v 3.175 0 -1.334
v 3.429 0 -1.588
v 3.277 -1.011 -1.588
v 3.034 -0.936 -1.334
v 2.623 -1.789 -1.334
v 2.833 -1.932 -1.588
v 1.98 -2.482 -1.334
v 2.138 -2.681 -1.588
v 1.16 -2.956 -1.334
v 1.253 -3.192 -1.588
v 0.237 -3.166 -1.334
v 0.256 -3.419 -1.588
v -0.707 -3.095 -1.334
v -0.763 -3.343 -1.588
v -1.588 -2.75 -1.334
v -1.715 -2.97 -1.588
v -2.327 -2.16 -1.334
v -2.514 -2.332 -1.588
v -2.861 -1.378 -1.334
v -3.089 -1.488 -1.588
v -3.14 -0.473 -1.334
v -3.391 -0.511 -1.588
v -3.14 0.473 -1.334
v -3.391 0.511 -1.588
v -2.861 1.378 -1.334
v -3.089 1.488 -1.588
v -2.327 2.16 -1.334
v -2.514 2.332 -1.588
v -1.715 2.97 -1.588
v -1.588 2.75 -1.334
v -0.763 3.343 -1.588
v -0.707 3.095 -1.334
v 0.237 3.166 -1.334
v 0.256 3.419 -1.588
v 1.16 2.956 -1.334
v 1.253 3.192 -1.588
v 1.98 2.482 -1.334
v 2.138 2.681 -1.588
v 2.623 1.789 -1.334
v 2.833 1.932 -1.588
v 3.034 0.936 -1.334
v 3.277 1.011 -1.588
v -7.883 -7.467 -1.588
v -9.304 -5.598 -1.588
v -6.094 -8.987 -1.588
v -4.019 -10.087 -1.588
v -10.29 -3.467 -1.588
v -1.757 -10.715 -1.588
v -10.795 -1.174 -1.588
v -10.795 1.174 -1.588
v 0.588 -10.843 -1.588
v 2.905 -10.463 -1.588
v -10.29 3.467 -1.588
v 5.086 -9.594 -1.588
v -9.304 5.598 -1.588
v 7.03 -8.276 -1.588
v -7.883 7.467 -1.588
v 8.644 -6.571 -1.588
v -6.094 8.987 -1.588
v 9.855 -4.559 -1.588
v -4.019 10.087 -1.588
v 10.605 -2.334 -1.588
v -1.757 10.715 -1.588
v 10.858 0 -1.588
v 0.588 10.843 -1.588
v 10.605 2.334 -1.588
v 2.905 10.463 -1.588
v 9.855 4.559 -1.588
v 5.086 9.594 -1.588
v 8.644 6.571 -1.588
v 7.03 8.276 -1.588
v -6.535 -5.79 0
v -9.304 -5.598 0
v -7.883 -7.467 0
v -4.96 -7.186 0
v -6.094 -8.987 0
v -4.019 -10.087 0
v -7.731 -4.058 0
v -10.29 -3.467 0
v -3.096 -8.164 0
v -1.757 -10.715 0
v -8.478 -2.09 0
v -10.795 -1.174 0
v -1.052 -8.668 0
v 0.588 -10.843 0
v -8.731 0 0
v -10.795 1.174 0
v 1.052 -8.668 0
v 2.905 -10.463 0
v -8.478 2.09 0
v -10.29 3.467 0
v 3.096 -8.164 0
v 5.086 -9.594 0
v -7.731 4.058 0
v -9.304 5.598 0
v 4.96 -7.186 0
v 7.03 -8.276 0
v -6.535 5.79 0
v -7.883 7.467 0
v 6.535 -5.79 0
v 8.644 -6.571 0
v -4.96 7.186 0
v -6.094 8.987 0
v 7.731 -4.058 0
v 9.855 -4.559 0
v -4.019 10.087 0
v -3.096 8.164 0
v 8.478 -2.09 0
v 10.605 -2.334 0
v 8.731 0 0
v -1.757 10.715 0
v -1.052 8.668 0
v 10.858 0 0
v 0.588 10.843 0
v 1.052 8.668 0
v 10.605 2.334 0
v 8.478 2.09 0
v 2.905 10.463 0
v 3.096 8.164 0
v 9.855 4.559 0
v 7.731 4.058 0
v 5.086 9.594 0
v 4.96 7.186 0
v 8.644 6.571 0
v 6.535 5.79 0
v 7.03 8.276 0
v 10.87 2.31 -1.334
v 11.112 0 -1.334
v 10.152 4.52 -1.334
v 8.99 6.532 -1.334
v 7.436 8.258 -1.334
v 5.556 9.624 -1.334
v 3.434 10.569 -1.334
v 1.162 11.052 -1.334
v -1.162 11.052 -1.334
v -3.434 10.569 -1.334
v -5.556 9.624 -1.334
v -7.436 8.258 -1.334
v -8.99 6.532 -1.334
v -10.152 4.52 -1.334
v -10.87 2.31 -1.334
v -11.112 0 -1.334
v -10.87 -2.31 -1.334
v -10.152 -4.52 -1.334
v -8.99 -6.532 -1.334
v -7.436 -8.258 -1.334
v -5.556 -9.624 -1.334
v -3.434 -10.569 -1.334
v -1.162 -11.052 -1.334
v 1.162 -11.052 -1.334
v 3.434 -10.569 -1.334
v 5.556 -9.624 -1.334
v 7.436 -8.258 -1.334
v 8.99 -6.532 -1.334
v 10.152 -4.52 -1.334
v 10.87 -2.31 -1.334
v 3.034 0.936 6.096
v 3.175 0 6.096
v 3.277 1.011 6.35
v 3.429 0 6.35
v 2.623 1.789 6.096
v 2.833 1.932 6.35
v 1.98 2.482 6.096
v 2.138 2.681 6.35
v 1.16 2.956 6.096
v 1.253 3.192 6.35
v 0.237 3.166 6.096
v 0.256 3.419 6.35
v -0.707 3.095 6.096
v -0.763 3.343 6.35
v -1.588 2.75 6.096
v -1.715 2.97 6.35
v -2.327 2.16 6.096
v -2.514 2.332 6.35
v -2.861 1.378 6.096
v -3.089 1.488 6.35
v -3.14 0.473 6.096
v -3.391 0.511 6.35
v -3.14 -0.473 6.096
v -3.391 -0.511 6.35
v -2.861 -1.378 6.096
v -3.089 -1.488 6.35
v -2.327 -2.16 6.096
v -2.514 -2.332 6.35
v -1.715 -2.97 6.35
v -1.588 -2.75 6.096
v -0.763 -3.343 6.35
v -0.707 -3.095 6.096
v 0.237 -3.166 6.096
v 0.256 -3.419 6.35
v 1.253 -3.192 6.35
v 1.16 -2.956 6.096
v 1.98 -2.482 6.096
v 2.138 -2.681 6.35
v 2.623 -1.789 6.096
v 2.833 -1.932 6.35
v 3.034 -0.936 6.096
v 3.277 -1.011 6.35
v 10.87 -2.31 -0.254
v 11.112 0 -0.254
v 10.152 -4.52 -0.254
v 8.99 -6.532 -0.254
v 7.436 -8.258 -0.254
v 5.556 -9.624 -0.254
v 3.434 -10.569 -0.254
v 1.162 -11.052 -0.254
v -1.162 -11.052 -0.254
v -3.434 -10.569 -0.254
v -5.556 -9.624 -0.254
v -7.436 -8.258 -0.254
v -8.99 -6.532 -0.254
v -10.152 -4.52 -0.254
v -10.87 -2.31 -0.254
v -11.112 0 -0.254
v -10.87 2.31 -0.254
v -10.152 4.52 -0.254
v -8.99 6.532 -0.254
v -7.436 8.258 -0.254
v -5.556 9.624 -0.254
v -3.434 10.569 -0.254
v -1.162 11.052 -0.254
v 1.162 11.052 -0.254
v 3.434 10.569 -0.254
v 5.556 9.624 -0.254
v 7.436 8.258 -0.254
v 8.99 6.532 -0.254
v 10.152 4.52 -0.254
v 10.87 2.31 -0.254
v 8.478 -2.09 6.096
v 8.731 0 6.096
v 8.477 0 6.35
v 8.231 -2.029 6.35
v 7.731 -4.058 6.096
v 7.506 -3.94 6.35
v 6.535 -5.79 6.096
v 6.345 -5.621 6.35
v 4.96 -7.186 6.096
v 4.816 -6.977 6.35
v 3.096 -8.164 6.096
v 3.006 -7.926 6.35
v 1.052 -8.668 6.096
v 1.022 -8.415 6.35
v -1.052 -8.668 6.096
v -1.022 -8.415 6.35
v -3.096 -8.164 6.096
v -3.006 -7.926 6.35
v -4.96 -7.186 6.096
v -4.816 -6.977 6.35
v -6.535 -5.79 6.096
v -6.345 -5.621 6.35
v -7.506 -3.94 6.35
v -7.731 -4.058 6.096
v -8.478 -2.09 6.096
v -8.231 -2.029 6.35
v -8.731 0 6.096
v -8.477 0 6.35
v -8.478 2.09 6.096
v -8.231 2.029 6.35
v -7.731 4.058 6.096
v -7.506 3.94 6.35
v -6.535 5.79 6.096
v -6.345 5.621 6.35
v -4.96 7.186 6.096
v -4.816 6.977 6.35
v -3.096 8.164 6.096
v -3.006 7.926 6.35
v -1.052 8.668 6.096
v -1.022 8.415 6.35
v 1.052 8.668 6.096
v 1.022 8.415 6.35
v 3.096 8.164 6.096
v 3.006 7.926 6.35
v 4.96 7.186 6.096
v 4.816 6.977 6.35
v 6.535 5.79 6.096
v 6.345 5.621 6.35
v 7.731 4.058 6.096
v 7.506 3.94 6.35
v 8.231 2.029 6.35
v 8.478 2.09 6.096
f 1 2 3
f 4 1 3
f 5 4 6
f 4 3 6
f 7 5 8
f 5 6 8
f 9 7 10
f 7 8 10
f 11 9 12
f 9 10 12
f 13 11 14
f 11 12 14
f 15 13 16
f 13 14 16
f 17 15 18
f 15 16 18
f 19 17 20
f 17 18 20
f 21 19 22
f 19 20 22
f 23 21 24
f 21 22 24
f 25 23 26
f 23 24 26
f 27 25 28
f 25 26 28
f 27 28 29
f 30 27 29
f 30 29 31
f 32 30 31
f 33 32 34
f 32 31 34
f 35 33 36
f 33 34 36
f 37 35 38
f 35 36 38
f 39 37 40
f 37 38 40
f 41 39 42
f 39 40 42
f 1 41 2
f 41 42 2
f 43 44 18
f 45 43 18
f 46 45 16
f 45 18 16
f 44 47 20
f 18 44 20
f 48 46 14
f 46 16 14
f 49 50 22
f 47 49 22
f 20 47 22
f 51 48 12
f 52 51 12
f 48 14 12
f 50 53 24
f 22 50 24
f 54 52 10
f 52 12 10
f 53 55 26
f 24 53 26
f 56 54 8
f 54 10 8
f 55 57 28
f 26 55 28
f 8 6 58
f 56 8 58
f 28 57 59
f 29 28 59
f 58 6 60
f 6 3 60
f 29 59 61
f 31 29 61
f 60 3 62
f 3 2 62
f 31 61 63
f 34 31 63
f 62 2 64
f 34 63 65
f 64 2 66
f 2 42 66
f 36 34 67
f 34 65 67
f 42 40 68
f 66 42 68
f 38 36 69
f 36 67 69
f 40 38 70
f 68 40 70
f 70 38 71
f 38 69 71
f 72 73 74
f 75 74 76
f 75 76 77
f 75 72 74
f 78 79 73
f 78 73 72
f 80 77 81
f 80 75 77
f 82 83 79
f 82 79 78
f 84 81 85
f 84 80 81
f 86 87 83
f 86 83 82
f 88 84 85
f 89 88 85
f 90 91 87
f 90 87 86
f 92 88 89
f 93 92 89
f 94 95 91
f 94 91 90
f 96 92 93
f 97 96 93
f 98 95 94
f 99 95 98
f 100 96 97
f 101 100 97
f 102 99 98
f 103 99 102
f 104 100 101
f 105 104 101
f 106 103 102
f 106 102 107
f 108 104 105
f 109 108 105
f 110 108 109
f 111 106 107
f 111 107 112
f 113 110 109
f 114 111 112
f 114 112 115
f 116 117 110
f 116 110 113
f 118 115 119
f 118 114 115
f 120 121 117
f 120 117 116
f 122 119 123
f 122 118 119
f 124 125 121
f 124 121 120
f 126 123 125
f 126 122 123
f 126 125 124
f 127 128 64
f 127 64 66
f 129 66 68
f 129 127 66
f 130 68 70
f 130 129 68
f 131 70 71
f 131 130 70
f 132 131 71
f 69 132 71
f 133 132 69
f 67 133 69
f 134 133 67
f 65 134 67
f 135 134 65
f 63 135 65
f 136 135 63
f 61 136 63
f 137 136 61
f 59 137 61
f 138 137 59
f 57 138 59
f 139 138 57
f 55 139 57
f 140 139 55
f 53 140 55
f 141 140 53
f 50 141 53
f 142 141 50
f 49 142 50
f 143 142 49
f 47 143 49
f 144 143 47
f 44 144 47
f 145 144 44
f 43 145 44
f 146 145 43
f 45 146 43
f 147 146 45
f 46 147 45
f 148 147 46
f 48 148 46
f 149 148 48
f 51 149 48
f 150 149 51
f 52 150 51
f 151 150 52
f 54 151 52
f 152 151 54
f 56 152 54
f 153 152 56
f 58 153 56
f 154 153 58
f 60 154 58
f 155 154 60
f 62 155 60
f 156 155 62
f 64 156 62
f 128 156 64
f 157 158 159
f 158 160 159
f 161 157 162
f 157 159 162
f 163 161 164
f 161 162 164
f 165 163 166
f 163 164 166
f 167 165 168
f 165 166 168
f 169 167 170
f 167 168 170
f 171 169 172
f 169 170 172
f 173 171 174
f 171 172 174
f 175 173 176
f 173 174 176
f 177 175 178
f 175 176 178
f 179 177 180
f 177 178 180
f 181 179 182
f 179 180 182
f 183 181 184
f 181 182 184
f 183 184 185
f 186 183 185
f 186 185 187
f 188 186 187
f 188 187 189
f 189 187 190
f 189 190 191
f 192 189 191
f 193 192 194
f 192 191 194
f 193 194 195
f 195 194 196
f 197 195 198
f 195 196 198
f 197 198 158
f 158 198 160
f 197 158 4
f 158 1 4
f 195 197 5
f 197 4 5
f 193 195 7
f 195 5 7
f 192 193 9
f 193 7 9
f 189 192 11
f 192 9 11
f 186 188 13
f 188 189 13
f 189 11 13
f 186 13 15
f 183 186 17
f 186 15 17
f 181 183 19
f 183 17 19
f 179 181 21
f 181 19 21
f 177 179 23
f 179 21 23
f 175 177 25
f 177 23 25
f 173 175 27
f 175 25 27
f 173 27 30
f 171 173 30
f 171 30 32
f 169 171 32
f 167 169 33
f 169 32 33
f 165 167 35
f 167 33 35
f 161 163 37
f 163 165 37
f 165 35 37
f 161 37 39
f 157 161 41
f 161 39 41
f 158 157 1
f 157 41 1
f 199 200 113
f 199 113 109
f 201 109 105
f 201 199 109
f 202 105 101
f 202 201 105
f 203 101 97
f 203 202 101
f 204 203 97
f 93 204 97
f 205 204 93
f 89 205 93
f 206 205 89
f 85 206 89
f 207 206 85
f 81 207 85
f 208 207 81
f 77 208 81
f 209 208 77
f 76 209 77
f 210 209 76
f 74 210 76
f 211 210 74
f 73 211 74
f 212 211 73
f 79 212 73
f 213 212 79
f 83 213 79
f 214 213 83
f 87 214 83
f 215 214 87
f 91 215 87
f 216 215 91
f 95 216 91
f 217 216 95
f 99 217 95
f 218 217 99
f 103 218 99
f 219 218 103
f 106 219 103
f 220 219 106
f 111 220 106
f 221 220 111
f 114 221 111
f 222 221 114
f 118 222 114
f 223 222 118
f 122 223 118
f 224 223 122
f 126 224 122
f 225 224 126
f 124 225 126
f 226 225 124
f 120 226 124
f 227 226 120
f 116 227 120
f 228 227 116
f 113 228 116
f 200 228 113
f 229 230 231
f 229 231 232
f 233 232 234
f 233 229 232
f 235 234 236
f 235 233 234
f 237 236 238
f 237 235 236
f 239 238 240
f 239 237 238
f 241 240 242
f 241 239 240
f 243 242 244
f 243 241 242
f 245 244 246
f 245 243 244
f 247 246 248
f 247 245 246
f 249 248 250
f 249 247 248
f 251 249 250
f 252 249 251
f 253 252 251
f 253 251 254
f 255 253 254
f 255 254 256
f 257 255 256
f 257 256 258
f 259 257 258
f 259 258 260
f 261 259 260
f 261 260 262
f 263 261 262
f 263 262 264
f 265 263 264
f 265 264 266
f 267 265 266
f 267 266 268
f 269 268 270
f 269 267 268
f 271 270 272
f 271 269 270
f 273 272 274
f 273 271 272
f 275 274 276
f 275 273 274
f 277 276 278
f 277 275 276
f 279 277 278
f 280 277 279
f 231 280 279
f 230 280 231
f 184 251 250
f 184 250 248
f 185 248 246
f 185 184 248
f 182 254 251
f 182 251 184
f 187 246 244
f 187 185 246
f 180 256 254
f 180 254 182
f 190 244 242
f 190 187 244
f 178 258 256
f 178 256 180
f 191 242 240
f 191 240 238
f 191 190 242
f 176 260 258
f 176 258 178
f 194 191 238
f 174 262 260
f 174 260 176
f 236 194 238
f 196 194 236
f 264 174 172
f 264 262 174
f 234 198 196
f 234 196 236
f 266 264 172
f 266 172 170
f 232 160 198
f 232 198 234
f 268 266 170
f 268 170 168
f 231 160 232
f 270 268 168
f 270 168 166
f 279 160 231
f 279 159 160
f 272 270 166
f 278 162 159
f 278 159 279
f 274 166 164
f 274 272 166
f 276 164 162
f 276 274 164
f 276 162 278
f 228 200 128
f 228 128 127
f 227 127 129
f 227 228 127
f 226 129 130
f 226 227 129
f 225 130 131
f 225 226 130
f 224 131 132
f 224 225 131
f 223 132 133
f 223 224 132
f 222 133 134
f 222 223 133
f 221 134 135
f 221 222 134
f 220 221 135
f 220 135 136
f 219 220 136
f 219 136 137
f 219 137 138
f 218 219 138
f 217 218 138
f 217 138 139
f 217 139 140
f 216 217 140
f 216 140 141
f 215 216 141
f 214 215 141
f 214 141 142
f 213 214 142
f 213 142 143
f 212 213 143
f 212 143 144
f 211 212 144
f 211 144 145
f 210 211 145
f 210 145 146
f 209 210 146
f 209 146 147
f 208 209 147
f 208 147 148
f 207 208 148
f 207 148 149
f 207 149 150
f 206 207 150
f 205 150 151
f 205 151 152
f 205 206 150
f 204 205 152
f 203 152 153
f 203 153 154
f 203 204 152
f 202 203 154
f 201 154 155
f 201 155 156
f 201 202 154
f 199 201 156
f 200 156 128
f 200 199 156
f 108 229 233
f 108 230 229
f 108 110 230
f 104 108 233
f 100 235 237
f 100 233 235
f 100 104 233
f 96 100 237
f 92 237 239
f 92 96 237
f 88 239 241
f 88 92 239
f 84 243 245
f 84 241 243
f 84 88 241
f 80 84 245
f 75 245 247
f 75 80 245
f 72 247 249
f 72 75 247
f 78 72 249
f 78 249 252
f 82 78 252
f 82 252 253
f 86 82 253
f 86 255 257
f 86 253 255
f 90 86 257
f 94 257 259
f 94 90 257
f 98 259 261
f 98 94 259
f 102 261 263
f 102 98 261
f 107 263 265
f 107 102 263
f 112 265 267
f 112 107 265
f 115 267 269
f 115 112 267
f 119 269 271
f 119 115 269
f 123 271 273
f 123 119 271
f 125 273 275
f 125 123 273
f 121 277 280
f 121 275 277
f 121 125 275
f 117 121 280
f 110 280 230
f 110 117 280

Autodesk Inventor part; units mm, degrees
ref_plane "YZ Plane" through (0, 0, 0) normal (1, 0, 0) x (0, 1, 0)
ref_plane "XZ Plane" through (0, 0, 0) normal (0, 1, 0) x (-1, 0, 0)
ref_plane "XY Plane" through (0, 0, 0) normal (0, 0, 1) x (1, 0, 0)
sketch "Sketch1" plane through (0, 0, 0) normal (0, 0, 1) x (1, 0, 0)
  circle A0 centre (0, 0) radius 8.7313
  circle A1 centre (0, 0) radius 11.1125
  circle A2 centre (0, 0) radius 3.175
  dimension "d0" = 17.4625
  dimension "d1" = 22.225
  dimension "d2" = 6.35
extrude "Extrusion1" add sketch "Sketch1" along normal blind 6.35 contours A0
extrude "Extrusion2" add sketch "Sketch1" against normal blind 1.5875 contours A0 | A1
chamfer "Chamfer1" distance 0.254 angle 45 5 edges at (-8.7313, 0, 6.35) (-11.1125, 0, 0) (-11.1125, 0, -1.5875) (-3.175, 0, 6.35) (-3.175, 0, -1.5875)
properties part number "0.25 in Flanged Ball Bearing" material "Steel"
